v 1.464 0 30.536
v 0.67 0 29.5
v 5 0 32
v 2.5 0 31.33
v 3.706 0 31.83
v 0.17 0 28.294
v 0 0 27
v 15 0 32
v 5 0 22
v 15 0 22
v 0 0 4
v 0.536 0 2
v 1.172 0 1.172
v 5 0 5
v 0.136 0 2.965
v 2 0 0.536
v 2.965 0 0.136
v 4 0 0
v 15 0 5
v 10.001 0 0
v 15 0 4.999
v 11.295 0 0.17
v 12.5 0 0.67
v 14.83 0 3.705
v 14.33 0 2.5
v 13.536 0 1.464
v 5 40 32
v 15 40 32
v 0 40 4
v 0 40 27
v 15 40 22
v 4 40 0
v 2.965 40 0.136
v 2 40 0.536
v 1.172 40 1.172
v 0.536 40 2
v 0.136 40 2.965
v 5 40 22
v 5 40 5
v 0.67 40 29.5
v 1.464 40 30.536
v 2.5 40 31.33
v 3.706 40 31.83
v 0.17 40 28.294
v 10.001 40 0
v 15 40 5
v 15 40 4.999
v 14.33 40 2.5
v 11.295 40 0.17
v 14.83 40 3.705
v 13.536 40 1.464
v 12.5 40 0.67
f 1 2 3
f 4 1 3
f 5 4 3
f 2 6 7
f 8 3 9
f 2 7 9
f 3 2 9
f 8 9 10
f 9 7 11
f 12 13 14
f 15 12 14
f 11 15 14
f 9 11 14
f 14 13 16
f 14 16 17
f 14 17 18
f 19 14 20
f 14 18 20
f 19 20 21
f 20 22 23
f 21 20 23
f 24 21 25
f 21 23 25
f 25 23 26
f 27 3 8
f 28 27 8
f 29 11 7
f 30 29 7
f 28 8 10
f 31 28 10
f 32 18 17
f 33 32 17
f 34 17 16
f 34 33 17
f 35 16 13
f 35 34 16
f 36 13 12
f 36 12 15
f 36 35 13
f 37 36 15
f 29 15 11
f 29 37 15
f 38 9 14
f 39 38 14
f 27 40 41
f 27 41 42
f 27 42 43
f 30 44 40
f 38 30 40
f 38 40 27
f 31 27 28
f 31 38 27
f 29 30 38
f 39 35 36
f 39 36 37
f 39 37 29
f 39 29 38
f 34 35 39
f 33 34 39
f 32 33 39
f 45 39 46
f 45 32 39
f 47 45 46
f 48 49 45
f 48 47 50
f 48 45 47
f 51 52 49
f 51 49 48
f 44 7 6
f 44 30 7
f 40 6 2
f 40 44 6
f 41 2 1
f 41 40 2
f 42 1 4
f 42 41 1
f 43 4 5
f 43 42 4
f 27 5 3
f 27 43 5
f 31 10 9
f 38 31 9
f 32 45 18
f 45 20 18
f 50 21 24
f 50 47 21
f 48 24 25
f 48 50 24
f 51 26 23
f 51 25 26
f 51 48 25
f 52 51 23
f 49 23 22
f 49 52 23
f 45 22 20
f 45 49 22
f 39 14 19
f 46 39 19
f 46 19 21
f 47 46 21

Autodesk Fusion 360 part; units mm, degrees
sketch "Sketch1" plane through (0, 0, 0) normal (0, 1, 0) x (1, 0, 0)
  line L0 (0, 0) -> (0, -32)
  line L1 (0, -32) -> (15, -32)
  line L2 (15, -32) -> (15, -22)
  line L3 (15, -22) -> (5, -22)
  line L4 (5, -22) -> (5, -5)
  line L5 (5, -5) -> (15, -5)
  line L6 (15, -5) -> (15, 0)
  line L7 (15, 0) -> (0, 0)
  dimension "d1" = 15
  dimension "d2" = 32
  dimension "d3" = 10
  dimension "d4" = 17
  dimension "d5" = 10
  dimension "d7" = 15
extrude "Extrude1" add sketch "Sketch1" along normal blind 40
fillet "Fillet1" radius 5 1 edges at (15, 20, 0)
fillet "Fillet2" radius 4 1 edges at (0, 20, 0)
fillet "Fillet3" radius 5 1 edges at (0, 20, 32)
equation "d2 = 17 mm + 10 mm + 5 mm"
